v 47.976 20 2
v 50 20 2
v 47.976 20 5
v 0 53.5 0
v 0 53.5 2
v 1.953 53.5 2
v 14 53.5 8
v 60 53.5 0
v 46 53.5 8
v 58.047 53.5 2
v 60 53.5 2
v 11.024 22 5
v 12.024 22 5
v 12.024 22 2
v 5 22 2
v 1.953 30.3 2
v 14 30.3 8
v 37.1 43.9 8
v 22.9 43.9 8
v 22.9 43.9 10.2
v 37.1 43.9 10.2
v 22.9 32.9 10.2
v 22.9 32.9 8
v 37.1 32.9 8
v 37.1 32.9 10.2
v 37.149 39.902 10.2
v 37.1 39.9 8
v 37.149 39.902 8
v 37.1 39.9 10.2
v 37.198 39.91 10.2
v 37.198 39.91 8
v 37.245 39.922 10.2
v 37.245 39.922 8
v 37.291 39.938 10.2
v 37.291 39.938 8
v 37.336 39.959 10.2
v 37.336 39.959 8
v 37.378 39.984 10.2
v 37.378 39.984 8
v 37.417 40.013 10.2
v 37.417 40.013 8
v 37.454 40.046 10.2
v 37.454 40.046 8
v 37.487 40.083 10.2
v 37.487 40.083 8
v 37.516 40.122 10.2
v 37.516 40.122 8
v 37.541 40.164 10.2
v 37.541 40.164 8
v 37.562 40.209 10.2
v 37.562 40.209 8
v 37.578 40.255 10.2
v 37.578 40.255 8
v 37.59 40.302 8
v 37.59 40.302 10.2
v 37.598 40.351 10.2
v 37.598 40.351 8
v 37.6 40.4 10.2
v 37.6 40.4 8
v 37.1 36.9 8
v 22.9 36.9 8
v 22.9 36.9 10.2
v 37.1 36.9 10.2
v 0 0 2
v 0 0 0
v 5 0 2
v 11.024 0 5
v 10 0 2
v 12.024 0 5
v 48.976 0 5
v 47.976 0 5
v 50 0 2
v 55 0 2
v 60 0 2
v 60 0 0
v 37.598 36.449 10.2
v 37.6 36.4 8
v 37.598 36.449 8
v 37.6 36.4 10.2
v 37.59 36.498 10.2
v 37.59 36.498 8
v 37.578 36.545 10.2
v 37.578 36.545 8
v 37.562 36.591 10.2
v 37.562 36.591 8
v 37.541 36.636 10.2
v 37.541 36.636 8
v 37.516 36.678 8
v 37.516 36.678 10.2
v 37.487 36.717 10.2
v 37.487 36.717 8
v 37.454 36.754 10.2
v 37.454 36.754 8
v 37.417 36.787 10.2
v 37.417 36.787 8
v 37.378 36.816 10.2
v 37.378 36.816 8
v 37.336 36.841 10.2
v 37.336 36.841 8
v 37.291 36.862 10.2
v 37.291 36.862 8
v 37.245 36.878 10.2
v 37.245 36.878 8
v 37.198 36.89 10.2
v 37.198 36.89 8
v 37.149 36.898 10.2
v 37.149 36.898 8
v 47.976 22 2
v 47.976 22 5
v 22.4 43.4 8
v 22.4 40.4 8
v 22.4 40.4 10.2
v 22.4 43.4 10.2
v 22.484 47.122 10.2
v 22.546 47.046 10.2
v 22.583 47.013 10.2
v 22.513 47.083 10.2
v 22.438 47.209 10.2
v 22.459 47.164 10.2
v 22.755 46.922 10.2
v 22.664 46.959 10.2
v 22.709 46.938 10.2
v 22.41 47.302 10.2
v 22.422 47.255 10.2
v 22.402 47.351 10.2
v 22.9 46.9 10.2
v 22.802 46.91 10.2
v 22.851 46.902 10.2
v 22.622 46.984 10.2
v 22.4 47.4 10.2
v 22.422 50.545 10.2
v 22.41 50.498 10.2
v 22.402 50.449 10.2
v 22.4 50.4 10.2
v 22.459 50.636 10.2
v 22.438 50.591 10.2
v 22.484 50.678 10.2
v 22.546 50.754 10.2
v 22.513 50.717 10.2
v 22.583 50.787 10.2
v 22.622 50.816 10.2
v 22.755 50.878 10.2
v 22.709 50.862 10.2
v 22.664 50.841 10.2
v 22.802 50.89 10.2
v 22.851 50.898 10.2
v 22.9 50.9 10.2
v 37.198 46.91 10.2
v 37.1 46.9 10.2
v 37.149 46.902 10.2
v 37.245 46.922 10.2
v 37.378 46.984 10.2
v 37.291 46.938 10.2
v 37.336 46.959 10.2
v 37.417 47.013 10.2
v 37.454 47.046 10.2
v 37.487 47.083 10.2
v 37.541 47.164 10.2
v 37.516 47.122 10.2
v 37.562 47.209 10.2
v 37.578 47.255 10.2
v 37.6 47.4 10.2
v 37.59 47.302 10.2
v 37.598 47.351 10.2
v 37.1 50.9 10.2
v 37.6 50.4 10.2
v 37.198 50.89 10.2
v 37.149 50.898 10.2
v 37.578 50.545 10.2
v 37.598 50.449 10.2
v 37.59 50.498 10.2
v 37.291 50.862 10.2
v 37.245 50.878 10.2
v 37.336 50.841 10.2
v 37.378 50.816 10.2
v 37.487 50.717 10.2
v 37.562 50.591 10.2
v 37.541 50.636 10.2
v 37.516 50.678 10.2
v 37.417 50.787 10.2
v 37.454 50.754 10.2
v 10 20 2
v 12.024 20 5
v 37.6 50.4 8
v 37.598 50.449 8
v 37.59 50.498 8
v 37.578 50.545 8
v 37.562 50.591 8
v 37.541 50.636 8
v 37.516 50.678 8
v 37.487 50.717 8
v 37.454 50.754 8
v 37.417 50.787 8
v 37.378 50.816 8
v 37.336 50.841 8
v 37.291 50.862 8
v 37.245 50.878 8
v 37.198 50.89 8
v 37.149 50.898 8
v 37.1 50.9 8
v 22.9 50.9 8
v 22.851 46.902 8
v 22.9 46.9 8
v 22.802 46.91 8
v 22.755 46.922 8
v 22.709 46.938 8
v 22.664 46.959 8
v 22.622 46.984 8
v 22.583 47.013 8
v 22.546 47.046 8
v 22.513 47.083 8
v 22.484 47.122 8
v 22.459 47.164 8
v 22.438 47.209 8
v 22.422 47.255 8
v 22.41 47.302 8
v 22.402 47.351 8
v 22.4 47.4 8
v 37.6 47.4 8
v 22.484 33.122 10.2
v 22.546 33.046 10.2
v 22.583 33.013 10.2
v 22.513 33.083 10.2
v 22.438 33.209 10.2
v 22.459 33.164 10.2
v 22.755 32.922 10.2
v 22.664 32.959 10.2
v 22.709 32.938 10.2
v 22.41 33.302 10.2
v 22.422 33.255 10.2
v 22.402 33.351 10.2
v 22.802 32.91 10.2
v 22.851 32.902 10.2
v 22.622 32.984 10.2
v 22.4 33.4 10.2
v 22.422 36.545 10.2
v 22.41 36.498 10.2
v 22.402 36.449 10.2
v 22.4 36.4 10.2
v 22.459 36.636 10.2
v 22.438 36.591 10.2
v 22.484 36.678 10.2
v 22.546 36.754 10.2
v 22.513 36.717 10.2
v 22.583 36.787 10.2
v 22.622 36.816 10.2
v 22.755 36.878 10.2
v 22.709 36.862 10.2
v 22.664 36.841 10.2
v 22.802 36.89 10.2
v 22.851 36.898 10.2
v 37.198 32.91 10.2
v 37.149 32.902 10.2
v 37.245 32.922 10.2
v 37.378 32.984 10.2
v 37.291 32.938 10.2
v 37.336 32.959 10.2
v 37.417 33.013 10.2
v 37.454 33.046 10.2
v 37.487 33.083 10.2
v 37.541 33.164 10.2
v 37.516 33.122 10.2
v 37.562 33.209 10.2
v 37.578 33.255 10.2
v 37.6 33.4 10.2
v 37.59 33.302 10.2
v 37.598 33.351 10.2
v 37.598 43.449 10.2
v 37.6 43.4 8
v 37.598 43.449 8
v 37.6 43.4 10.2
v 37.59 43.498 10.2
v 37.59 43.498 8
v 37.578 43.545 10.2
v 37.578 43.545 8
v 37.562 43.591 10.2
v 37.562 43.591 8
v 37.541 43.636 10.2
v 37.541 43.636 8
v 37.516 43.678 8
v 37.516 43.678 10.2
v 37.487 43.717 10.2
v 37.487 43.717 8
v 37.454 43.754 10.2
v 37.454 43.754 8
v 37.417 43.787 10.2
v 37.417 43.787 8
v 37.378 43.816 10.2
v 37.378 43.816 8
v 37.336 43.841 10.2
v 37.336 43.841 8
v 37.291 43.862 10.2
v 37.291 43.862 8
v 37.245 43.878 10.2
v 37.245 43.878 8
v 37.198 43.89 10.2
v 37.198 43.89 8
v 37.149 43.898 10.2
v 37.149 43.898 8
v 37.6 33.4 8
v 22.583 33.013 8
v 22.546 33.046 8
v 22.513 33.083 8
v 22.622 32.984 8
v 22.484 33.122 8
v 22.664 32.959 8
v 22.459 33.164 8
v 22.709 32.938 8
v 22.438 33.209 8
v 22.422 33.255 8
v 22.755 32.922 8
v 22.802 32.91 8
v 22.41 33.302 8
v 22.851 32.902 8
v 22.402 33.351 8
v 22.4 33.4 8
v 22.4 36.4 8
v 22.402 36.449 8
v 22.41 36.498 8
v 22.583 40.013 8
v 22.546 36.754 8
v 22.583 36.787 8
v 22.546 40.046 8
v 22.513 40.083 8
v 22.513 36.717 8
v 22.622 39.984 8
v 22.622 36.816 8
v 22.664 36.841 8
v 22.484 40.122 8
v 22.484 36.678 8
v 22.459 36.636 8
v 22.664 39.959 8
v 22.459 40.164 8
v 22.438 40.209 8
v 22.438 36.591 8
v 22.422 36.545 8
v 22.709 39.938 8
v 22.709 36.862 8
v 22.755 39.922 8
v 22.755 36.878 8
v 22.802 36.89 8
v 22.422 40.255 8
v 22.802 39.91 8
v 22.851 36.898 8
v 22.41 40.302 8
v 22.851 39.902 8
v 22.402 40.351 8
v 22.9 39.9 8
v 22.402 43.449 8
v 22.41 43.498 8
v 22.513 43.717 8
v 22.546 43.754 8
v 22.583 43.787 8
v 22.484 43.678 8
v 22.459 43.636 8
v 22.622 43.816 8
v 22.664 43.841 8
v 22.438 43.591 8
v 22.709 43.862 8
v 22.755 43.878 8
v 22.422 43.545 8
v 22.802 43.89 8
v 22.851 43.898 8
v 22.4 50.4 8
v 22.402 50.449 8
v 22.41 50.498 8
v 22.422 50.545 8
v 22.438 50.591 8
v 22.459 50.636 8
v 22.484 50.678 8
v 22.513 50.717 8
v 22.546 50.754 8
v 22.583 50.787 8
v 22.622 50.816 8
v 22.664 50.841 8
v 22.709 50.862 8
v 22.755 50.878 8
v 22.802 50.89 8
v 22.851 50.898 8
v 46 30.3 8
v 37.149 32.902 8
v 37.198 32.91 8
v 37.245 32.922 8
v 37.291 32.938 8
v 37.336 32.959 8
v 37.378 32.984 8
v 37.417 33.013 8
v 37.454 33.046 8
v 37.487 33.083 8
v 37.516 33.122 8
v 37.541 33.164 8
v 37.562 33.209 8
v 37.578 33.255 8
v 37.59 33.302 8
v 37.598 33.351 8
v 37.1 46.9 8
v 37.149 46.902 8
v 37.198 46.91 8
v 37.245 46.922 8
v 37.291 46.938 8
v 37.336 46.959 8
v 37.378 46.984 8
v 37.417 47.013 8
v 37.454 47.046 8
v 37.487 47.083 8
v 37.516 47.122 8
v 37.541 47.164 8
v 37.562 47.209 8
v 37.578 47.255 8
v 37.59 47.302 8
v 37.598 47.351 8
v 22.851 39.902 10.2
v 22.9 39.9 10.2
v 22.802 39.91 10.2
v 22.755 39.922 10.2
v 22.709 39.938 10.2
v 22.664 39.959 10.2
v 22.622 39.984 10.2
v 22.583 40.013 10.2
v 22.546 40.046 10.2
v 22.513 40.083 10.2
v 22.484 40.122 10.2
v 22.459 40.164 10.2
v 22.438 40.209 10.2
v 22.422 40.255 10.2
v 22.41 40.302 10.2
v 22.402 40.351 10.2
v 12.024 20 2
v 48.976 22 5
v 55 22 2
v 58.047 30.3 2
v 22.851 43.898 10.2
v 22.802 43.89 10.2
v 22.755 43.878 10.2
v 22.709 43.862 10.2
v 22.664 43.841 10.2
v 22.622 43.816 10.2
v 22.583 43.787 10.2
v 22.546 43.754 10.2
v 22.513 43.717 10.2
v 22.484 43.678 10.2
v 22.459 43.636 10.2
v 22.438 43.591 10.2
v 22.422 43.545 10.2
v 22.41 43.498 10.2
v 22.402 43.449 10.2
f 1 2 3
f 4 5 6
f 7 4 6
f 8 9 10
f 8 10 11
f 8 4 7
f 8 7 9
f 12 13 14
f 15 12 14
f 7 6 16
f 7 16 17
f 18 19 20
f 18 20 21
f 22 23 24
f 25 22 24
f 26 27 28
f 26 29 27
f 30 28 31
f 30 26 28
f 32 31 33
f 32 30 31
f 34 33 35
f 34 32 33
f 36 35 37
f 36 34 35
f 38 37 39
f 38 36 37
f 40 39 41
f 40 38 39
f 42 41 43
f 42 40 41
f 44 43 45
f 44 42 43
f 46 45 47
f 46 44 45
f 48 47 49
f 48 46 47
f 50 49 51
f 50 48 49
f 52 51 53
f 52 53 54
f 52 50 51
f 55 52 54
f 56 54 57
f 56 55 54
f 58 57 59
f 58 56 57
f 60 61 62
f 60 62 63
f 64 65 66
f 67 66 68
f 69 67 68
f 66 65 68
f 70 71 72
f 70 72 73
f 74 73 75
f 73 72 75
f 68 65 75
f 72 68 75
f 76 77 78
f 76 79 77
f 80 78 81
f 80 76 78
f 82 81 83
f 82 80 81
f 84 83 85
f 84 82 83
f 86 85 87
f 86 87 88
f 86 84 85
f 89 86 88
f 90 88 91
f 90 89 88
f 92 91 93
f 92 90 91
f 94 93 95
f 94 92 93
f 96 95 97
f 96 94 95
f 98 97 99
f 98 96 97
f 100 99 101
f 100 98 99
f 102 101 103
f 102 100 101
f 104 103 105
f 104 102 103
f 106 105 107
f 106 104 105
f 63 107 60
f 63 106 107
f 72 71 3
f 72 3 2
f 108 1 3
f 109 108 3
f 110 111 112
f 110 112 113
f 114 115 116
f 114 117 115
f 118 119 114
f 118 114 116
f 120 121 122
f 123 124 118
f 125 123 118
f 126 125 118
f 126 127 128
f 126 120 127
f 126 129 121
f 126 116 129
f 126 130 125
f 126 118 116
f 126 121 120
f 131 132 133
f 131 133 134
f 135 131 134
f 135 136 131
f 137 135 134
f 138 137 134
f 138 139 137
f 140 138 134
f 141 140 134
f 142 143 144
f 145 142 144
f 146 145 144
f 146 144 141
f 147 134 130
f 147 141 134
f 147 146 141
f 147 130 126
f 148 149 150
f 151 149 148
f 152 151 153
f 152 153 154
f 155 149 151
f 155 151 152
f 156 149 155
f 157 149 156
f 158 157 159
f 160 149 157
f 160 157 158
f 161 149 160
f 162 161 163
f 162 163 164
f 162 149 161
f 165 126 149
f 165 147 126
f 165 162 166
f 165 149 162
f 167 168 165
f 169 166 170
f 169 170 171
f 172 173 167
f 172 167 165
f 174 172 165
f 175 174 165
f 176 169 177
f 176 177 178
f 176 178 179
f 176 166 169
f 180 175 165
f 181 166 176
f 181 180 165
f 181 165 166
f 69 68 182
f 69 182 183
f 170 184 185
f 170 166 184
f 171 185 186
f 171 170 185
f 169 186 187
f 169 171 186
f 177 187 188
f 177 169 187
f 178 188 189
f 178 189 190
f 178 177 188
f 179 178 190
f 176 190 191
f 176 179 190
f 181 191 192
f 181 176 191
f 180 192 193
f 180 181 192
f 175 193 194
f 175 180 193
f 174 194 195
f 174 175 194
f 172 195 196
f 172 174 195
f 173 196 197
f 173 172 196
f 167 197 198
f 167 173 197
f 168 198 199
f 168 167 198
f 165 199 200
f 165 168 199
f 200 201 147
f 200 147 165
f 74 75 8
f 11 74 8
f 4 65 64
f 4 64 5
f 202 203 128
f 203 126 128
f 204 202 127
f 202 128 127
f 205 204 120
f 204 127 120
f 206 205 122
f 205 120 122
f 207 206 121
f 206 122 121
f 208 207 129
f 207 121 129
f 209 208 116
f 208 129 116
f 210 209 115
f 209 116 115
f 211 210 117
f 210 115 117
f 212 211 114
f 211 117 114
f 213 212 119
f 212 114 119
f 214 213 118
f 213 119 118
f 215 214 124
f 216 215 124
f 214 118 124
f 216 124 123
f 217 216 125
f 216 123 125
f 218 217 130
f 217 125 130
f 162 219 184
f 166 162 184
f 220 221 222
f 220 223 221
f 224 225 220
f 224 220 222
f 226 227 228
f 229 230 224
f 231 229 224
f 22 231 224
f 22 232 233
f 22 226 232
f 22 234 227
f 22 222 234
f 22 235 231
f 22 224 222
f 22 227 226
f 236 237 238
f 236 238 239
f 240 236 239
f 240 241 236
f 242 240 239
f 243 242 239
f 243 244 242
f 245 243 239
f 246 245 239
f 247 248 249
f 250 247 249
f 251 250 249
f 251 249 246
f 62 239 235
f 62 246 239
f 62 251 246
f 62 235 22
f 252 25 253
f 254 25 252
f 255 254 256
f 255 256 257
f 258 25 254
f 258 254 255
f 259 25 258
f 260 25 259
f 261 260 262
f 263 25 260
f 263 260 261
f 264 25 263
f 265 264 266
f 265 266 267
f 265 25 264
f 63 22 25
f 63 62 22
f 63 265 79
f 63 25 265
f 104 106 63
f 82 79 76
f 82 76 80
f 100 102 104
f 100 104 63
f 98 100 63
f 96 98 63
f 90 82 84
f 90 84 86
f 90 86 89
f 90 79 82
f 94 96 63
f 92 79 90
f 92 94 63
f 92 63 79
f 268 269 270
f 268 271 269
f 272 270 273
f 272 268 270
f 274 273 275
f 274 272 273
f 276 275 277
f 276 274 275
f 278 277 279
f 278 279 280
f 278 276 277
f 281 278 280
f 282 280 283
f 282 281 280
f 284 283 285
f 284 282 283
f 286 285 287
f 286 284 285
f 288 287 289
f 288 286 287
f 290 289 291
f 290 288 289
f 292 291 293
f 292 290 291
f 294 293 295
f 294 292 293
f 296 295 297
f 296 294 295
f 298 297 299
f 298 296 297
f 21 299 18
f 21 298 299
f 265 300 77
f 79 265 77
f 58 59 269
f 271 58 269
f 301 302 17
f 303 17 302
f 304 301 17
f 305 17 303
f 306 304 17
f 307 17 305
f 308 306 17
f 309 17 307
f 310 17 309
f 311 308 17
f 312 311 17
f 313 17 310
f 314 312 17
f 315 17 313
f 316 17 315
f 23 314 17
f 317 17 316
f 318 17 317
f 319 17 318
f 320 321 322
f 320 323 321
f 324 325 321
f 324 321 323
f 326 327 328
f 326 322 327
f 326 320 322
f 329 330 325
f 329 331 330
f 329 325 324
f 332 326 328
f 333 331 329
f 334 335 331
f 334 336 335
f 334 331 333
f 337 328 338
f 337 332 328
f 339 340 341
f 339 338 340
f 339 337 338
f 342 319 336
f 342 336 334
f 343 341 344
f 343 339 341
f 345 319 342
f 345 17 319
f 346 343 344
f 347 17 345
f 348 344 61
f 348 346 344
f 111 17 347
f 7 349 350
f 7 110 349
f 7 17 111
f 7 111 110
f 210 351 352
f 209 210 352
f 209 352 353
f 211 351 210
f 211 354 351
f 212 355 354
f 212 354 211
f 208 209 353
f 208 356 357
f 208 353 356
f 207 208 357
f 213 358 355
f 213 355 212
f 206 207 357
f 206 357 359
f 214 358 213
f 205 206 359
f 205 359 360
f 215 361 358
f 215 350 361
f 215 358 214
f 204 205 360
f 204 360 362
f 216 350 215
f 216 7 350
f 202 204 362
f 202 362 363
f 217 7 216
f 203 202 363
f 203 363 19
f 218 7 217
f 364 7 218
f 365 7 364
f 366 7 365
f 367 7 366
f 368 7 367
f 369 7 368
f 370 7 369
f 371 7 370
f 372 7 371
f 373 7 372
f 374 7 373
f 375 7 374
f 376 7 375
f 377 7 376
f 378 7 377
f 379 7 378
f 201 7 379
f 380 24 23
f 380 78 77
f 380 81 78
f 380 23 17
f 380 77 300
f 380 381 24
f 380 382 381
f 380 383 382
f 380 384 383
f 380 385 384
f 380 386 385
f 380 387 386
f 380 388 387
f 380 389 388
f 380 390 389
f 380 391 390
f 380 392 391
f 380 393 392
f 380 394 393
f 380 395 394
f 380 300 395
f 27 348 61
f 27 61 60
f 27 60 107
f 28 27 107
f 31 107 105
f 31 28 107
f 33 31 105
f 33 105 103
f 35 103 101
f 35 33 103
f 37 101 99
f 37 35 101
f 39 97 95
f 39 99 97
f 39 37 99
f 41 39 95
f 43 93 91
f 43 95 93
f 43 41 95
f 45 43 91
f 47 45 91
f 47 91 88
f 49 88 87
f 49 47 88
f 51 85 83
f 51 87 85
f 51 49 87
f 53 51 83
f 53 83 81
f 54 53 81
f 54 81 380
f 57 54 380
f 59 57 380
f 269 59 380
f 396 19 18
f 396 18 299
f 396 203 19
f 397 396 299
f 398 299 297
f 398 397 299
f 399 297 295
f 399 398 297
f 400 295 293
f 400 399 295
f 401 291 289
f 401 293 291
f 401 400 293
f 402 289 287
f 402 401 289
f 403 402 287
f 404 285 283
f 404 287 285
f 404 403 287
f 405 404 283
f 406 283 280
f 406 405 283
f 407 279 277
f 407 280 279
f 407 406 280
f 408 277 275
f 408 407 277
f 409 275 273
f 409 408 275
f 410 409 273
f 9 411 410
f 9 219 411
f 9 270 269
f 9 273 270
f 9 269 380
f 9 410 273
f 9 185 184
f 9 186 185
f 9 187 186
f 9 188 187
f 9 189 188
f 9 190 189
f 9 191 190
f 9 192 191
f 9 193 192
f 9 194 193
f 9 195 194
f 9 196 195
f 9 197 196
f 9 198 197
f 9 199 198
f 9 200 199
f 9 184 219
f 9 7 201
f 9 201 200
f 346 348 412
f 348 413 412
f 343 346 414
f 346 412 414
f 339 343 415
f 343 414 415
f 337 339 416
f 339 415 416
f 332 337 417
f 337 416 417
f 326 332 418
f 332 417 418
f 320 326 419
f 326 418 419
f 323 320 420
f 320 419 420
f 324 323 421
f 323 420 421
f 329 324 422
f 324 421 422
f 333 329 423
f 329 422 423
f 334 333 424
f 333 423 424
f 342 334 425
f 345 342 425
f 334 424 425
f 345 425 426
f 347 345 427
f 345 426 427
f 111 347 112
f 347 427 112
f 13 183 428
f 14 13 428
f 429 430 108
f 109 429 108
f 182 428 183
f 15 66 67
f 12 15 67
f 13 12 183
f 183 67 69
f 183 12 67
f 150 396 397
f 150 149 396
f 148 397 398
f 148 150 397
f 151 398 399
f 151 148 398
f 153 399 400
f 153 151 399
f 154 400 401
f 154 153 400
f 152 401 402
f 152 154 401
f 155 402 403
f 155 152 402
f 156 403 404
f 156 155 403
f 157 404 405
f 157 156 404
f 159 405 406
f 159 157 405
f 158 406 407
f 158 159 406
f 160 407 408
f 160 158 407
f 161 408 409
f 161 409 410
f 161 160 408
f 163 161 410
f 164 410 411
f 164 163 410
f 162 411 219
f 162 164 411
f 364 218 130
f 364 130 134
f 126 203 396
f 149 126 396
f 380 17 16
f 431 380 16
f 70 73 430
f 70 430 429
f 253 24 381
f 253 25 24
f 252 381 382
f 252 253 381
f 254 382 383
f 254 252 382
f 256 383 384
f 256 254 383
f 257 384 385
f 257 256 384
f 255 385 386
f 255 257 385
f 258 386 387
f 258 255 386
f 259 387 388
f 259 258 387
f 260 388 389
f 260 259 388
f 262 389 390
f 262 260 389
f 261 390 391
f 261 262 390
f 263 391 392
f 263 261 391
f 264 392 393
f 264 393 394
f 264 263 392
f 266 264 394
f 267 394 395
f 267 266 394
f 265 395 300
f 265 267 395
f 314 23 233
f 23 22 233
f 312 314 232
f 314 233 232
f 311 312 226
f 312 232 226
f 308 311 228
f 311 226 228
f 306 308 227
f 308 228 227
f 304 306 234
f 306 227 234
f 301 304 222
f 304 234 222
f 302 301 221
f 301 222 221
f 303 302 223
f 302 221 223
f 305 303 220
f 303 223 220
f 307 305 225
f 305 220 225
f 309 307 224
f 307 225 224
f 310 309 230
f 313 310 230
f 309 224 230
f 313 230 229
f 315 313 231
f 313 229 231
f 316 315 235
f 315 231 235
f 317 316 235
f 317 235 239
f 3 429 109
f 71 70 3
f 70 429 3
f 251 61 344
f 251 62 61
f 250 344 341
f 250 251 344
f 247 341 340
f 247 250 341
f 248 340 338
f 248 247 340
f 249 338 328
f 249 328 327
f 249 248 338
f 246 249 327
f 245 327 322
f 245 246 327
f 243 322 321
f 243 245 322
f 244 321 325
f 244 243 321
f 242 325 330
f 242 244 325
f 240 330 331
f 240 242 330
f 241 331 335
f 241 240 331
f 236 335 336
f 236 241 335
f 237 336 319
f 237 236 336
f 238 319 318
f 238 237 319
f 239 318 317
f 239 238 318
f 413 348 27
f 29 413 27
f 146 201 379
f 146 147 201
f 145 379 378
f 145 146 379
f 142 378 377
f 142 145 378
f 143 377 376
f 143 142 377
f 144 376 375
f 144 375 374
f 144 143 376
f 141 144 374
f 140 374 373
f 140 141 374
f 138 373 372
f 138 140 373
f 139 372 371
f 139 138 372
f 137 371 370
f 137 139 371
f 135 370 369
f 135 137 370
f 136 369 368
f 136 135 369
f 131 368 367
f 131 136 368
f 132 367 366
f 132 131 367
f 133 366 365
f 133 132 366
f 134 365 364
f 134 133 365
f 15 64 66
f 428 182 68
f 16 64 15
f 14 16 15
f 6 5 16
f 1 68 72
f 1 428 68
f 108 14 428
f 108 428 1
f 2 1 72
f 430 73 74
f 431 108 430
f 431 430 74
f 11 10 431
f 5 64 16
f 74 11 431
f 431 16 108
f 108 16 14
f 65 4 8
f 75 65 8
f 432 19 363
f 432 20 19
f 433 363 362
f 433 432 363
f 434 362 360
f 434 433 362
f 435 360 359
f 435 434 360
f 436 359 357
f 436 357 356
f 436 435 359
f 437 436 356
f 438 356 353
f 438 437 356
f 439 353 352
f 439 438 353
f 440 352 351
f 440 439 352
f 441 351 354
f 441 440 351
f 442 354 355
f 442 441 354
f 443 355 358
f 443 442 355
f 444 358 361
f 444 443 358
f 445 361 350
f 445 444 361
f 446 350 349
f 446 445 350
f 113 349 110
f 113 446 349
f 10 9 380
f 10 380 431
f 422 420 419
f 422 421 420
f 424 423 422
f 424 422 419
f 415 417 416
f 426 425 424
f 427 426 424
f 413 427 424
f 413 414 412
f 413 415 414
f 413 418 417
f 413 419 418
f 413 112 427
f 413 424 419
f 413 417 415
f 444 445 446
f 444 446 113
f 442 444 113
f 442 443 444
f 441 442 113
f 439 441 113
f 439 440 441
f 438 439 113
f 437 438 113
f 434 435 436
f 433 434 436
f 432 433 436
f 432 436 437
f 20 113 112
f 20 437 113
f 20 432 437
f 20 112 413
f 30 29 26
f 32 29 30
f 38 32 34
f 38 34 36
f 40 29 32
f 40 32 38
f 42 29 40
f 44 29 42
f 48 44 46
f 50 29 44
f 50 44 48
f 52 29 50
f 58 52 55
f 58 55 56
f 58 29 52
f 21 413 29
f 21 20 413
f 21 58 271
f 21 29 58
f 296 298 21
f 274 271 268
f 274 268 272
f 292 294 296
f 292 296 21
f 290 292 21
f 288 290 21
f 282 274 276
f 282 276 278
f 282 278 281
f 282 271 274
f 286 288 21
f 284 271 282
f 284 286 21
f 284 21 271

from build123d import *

# Parameters (mm, degrees)
F0_W      = 60
F0_H      = 53.5
F1_DEPTH  = 2
F3_DEPTH  = 23.2
F4_W      = 15.2
F4_H      = 4
F5_DEPTH  = 2.2
F6_R      = 0.5
F8_DEPTH  = 20
F11_DEPTH = 2


with BuildPart() as f1:
    # F0 (on Top) → F1 (new body)
    with BuildSketch(Plane.XY):
        with Locations((30, 26.75)):
            Rectangle(F0_W, F0_H)
    extrude(amount=F1_DEPTH)

    # F2 (on face) → F3 (join)
    with BuildSketch(Plane(origin=(0, 53.5, 0), x_dir=(-1, 0, 0), z_dir=(0, 1, 0))):
        Polygon((-1.9529488989, 2), (-14, 8), (-46, 8), (-58.0470511011, 2), align=None)
    extrude(amount=-F3_DEPTH)

    # F4 (on face) → F5 (join)
    with BuildSketch(Plane.XY.offset(8)):
        with Locations((30, 48.9)):
            Rectangle(F4_W, F4_H)
        with Locations((30, 41.9)):
            Rectangle(F4_W, F4_H)
        with Locations((30, 34.9)):
            Rectangle(F4_W, F4_H)
    extrude(amount=F5_DEPTH)

    # F6
    f6_edges = [f1.edges().sort_by_distance(p)[0] for p in [
        (22.4, 46.9, 9.1),
        (22.4, 39.9, 9.1),
        (22.4, 32.9, 9.1),
        (22.4, 36.9, 9.1),
        (22.4, 43.9, 9.1),
        (22.4, 50.9, 9.1),
        (37.6, 32.9, 9.1),
        (37.6, 36.9, 9.1),
        (37.6, 39.9, 9.1),
        (37.6, 43.9, 9.1),
        (37.6, 46.9, 9.1),
        (37.6, 50.9, 9.1),
    ]]
    fillet(f6_edges, radius=F6_R)

    # F7 (on face) → F8 (join)
    with BuildSketch(Plane.XZ):
        Polygon((5, 2), (10, 2), (12.0235255505, 5), (11.0235255505, 5), align=None)
        Polygon((47.9764744495, 5), (50, 2), (55, 2), (48.9764744495, 5), align=None)
    extrude(amount=-F8_DEPTH)

    # F9 (on face) + F10 (on face) → F11 (join)
    with BuildSketch(Plane(origin=(0, 20, 0), x_dir=(-1, 0, 0), z_dir=(0, 1, 0))):
        Polygon((-10, 2), (-5, 2), (-11.0235255505, 5), (-12.0235255505, 5), align=None)
        Polygon((-12.0235255505, 2), (-10, 2), (-12.0235255505, 5), align=None)
    with BuildSketch(Plane(origin=(0, 20, 0), x_dir=(-1, 0, 0), z_dir=(0, 1, 0))):
        Polygon((-47.9764744495, 5), (-50, 2), (-47.9764744495, 2), align=None)
        Polygon((-48.9764744495, 5), (-55, 2), (-50, 2), (-47.9764744495, 5), align=None)
    extrude(amount=F11_DEPTH)


solid = f1.part
